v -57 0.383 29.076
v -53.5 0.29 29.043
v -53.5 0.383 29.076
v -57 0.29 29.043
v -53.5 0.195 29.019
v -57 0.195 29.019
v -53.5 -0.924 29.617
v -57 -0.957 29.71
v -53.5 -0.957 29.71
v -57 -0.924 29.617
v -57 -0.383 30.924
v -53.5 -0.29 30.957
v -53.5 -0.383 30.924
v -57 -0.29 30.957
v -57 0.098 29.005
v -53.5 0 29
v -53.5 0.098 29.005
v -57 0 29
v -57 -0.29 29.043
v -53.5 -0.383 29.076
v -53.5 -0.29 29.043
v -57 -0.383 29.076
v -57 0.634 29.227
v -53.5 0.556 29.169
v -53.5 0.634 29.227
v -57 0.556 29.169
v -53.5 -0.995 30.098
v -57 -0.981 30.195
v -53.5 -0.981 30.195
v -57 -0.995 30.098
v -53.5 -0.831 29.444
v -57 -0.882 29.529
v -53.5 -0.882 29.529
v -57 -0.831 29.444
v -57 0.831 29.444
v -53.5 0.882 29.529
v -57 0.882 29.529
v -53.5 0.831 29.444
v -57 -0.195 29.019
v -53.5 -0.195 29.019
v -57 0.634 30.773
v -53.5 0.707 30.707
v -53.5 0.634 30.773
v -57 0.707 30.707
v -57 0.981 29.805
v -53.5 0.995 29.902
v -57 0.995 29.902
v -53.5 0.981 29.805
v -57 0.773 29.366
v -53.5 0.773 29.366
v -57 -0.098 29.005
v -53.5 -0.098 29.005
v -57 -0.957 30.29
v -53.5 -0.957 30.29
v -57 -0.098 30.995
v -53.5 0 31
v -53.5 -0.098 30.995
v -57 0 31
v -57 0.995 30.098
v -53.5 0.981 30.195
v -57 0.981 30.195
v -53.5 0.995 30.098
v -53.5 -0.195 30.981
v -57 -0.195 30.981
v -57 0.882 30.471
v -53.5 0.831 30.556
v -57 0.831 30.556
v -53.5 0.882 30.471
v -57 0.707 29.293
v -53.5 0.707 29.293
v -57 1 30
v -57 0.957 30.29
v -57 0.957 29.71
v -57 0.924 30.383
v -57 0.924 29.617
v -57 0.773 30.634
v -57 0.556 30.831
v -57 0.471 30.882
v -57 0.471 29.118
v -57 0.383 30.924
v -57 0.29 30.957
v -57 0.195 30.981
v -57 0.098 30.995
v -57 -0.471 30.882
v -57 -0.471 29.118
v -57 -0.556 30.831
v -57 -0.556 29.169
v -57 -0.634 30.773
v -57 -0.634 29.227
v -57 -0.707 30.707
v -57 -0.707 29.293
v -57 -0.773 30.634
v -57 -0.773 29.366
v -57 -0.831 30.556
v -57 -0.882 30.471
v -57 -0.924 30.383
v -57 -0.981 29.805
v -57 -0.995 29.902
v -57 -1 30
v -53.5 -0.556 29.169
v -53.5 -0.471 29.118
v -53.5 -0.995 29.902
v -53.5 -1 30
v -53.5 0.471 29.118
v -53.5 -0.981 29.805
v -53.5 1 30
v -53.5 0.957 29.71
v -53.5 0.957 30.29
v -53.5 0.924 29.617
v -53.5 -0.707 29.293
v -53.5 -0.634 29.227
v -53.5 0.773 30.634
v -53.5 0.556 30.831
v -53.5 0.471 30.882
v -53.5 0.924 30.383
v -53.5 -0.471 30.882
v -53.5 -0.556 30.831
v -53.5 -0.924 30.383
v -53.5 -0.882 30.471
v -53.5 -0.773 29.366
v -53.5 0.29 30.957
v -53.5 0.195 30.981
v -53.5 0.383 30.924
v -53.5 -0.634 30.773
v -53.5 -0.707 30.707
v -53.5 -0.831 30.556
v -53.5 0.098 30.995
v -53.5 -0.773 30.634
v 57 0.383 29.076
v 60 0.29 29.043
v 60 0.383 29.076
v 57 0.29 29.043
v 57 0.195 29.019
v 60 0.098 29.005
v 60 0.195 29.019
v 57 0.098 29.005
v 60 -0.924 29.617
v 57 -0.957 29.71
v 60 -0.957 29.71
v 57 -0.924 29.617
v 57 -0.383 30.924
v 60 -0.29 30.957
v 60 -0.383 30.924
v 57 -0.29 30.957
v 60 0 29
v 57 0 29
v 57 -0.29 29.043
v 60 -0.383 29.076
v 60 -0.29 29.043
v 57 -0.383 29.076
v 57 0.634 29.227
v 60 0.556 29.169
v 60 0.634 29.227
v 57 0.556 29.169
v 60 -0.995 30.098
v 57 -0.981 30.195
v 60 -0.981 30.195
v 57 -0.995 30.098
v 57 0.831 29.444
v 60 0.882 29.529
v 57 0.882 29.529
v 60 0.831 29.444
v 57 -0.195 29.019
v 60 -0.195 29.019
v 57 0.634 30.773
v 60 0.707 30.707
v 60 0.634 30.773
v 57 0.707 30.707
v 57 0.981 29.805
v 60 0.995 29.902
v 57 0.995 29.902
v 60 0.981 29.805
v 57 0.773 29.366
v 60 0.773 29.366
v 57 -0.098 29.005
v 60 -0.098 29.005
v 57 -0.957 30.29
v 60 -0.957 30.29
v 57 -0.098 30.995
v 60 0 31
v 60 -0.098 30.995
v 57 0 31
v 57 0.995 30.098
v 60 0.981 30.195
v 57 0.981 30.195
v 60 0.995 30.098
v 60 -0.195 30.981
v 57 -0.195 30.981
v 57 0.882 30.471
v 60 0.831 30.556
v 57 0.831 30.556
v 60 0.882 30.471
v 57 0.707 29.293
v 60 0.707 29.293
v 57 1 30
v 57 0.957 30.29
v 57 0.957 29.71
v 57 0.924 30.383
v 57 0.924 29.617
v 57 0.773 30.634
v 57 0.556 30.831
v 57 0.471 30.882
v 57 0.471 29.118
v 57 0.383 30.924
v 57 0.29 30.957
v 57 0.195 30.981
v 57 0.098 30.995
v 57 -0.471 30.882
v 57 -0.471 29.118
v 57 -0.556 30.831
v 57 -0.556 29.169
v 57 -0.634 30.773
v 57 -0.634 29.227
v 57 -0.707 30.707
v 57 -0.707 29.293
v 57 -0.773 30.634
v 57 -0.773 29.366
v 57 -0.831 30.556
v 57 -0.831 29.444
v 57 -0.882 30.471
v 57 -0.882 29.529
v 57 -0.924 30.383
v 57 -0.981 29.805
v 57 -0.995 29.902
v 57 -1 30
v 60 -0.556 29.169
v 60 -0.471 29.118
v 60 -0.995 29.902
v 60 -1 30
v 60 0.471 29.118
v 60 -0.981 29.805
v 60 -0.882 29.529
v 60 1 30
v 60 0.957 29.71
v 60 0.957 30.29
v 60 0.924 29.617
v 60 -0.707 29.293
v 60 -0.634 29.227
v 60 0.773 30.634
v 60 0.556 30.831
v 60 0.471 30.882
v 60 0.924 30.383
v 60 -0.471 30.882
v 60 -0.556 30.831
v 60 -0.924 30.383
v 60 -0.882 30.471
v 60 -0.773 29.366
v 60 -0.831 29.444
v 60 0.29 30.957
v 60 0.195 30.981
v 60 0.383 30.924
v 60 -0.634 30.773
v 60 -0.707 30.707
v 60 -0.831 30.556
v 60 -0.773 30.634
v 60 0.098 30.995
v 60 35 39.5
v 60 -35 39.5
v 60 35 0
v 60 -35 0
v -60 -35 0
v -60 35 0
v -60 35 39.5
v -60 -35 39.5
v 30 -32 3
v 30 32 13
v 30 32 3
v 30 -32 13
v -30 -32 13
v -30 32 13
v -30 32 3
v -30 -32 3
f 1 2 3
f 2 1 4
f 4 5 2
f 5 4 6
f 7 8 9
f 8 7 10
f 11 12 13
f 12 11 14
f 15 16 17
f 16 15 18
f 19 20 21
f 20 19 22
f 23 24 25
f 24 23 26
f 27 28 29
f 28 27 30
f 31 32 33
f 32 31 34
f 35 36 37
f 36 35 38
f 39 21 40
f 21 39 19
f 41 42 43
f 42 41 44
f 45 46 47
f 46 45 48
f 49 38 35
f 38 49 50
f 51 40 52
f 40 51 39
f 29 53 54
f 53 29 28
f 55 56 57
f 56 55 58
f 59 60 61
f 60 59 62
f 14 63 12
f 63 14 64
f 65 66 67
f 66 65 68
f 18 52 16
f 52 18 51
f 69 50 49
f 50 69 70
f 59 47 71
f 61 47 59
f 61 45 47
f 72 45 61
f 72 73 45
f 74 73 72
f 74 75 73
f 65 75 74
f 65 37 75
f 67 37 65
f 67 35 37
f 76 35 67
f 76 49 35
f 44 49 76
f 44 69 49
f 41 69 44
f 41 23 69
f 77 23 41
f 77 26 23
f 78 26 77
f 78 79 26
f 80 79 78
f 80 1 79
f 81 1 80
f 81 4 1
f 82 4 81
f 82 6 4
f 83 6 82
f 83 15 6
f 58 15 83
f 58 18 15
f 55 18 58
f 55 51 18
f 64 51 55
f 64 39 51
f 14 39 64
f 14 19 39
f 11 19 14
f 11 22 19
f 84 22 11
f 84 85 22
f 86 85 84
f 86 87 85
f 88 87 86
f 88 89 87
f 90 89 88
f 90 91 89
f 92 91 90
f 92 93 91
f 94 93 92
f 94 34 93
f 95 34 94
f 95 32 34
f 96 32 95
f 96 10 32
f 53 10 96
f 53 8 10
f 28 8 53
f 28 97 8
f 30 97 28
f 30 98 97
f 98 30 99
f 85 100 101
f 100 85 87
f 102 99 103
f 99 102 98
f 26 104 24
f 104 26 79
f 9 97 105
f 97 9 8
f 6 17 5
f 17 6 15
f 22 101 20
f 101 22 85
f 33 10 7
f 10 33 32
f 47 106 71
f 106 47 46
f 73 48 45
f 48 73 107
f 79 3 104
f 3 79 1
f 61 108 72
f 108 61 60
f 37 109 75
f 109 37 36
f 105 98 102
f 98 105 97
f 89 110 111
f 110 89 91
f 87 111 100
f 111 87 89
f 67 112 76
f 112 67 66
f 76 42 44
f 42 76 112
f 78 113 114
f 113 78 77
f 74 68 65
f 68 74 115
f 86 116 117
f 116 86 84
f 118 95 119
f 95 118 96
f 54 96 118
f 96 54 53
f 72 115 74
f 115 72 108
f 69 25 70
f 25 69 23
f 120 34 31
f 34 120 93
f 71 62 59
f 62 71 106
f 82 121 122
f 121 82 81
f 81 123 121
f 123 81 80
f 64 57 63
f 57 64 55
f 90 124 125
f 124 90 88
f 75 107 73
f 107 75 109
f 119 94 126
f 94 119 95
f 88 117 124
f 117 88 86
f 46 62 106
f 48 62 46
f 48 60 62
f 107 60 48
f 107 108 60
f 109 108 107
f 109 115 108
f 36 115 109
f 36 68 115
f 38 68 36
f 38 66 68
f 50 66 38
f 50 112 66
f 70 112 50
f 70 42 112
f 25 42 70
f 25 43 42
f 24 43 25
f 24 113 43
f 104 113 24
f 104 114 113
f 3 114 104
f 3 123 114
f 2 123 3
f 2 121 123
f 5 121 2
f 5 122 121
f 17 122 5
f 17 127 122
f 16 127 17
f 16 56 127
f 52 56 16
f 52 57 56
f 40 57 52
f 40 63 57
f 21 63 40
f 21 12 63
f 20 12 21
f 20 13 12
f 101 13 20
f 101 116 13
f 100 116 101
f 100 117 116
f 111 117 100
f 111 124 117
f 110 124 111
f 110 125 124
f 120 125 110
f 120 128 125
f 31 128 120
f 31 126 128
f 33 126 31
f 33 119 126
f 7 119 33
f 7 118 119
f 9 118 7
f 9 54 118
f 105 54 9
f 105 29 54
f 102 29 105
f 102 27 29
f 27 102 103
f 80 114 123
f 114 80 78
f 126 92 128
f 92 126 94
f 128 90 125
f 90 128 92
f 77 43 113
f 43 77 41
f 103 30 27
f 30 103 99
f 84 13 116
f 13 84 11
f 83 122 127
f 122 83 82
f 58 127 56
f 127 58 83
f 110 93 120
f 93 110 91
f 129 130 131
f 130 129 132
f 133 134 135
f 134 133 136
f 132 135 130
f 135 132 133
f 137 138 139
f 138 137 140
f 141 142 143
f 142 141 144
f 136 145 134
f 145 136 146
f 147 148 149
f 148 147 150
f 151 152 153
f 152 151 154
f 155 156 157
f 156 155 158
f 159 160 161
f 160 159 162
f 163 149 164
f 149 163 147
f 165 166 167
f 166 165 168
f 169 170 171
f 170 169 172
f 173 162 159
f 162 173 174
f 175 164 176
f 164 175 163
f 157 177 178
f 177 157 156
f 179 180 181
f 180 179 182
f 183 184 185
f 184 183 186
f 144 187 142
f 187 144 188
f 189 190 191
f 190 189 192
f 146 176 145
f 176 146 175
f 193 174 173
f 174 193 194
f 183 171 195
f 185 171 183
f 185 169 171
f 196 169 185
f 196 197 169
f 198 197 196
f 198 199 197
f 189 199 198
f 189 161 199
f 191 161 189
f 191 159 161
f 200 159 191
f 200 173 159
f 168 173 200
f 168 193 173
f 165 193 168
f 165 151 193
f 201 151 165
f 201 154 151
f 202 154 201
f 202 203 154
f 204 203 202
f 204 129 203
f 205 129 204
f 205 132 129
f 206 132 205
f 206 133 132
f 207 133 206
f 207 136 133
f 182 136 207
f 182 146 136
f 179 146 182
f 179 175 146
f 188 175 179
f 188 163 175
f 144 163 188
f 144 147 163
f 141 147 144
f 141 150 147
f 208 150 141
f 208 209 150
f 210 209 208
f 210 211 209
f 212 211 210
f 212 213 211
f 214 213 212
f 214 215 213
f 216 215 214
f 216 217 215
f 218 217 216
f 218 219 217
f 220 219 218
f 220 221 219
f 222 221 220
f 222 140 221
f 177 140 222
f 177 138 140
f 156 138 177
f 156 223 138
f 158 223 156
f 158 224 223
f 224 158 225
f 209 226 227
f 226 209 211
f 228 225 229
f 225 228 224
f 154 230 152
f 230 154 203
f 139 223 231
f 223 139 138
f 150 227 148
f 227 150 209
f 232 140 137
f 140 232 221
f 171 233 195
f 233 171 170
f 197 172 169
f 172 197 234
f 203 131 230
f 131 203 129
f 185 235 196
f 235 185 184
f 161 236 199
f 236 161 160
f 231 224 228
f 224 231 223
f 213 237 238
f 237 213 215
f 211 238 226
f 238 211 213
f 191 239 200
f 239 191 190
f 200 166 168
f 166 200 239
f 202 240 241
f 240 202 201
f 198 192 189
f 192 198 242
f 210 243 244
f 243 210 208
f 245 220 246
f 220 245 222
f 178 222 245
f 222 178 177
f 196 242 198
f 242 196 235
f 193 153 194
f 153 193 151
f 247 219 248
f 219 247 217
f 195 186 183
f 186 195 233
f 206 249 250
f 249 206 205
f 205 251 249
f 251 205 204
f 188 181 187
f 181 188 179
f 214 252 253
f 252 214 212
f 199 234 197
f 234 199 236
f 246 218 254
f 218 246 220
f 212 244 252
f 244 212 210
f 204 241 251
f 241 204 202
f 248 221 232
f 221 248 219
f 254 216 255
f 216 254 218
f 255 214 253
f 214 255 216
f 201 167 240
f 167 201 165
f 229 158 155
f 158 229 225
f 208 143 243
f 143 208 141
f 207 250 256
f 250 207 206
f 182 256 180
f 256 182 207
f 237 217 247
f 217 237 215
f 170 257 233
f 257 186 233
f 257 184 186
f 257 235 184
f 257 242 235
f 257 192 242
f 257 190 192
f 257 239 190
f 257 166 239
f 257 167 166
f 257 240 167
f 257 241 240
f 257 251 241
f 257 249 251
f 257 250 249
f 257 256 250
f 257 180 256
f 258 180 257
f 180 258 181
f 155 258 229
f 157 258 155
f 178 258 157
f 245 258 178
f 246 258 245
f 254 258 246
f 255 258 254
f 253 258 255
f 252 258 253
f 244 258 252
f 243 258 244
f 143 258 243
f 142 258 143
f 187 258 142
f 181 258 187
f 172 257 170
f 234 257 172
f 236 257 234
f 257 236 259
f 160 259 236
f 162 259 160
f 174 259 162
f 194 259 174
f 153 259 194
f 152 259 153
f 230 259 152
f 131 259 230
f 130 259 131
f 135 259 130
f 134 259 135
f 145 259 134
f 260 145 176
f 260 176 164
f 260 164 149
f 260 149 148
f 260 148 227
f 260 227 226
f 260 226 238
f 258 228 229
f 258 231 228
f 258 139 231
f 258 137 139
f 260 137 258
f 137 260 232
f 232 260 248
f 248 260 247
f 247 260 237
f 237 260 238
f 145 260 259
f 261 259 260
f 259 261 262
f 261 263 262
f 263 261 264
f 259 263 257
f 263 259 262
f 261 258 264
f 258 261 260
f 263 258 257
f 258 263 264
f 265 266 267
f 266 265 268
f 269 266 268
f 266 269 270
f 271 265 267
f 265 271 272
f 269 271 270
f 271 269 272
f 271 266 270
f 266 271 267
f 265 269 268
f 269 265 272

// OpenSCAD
// Mini horizontal gel-electrophoresis box - buffer tank
// Print orientation: open top facing up (+Z), resting on XY plane at z = 0

// ---------------- Parameters ----------------
tank_x      = 120;   // outer length in X (mm)
tank_y      = 70;    // outer width in Y (mm)
tank_h      = 40;    // outer height in Z (mm)
wall        = 3;     // wall thickness (mm)
floor       = 3;     // floor thickness (mm)

platform_x  = 60;    // platform length in X, centred (mm)
platform_y  = tank_y - 2 * wall;  // platform spans full inner width (mm)
platform_top = floor + 10;  // platform top height, 10 mm above inner floor (mm)

hole_d      = 2;     // electrode wire hole diameter (mm)
hole_y      = 0;     // hole centre Y position (mm)
hole_z      = 30;    // hole centre Z position (mm)

eps         = 0.5;   // cutter overshoot past faces (mm)
$fn         = 96;    // curve resolution

// ---------------- Derived ----------------
inner_x = tank_x - 2 * wall;   // inner floor length in X
inner_y = tank_y - 2 * wall;   // inner floor width in Y
floor_t = floor;               // floor thickness (same as floor variable)

// ---------------- Model ----------------
difference() {
    // Main tank body: open-top rectangular box with solid floor
    translate([-tank_x / 2, -tank_y / 2, 0])
        cube([tank_x, tank_y, tank_h]);

    // Cut open top, through full area but stopping at floor thickness
    translate([-tank_x / 2, -tank_y / 2, tank_h - eps])
        cube([tank_x, tank_y, floor_t + eps]);

    // Raised platform in the middle, sitting on the floor
    translate([-platform_x / 2, -platform_y / 2, floor])
        cube([platform_x, platform_y, platform_top - floor]);

    // Horizontal electrode wire holes through each end wall, along X
    for (s = [-1, 1])
        translate([s > 0 ? tank_x / 2 - wall : -tank_x / 2 + wall, hole_y, hole_z])
            rotate([0, 90, 0])
                cylinder(d = hole_d, h = wall + eps, $fn = 64);
}
